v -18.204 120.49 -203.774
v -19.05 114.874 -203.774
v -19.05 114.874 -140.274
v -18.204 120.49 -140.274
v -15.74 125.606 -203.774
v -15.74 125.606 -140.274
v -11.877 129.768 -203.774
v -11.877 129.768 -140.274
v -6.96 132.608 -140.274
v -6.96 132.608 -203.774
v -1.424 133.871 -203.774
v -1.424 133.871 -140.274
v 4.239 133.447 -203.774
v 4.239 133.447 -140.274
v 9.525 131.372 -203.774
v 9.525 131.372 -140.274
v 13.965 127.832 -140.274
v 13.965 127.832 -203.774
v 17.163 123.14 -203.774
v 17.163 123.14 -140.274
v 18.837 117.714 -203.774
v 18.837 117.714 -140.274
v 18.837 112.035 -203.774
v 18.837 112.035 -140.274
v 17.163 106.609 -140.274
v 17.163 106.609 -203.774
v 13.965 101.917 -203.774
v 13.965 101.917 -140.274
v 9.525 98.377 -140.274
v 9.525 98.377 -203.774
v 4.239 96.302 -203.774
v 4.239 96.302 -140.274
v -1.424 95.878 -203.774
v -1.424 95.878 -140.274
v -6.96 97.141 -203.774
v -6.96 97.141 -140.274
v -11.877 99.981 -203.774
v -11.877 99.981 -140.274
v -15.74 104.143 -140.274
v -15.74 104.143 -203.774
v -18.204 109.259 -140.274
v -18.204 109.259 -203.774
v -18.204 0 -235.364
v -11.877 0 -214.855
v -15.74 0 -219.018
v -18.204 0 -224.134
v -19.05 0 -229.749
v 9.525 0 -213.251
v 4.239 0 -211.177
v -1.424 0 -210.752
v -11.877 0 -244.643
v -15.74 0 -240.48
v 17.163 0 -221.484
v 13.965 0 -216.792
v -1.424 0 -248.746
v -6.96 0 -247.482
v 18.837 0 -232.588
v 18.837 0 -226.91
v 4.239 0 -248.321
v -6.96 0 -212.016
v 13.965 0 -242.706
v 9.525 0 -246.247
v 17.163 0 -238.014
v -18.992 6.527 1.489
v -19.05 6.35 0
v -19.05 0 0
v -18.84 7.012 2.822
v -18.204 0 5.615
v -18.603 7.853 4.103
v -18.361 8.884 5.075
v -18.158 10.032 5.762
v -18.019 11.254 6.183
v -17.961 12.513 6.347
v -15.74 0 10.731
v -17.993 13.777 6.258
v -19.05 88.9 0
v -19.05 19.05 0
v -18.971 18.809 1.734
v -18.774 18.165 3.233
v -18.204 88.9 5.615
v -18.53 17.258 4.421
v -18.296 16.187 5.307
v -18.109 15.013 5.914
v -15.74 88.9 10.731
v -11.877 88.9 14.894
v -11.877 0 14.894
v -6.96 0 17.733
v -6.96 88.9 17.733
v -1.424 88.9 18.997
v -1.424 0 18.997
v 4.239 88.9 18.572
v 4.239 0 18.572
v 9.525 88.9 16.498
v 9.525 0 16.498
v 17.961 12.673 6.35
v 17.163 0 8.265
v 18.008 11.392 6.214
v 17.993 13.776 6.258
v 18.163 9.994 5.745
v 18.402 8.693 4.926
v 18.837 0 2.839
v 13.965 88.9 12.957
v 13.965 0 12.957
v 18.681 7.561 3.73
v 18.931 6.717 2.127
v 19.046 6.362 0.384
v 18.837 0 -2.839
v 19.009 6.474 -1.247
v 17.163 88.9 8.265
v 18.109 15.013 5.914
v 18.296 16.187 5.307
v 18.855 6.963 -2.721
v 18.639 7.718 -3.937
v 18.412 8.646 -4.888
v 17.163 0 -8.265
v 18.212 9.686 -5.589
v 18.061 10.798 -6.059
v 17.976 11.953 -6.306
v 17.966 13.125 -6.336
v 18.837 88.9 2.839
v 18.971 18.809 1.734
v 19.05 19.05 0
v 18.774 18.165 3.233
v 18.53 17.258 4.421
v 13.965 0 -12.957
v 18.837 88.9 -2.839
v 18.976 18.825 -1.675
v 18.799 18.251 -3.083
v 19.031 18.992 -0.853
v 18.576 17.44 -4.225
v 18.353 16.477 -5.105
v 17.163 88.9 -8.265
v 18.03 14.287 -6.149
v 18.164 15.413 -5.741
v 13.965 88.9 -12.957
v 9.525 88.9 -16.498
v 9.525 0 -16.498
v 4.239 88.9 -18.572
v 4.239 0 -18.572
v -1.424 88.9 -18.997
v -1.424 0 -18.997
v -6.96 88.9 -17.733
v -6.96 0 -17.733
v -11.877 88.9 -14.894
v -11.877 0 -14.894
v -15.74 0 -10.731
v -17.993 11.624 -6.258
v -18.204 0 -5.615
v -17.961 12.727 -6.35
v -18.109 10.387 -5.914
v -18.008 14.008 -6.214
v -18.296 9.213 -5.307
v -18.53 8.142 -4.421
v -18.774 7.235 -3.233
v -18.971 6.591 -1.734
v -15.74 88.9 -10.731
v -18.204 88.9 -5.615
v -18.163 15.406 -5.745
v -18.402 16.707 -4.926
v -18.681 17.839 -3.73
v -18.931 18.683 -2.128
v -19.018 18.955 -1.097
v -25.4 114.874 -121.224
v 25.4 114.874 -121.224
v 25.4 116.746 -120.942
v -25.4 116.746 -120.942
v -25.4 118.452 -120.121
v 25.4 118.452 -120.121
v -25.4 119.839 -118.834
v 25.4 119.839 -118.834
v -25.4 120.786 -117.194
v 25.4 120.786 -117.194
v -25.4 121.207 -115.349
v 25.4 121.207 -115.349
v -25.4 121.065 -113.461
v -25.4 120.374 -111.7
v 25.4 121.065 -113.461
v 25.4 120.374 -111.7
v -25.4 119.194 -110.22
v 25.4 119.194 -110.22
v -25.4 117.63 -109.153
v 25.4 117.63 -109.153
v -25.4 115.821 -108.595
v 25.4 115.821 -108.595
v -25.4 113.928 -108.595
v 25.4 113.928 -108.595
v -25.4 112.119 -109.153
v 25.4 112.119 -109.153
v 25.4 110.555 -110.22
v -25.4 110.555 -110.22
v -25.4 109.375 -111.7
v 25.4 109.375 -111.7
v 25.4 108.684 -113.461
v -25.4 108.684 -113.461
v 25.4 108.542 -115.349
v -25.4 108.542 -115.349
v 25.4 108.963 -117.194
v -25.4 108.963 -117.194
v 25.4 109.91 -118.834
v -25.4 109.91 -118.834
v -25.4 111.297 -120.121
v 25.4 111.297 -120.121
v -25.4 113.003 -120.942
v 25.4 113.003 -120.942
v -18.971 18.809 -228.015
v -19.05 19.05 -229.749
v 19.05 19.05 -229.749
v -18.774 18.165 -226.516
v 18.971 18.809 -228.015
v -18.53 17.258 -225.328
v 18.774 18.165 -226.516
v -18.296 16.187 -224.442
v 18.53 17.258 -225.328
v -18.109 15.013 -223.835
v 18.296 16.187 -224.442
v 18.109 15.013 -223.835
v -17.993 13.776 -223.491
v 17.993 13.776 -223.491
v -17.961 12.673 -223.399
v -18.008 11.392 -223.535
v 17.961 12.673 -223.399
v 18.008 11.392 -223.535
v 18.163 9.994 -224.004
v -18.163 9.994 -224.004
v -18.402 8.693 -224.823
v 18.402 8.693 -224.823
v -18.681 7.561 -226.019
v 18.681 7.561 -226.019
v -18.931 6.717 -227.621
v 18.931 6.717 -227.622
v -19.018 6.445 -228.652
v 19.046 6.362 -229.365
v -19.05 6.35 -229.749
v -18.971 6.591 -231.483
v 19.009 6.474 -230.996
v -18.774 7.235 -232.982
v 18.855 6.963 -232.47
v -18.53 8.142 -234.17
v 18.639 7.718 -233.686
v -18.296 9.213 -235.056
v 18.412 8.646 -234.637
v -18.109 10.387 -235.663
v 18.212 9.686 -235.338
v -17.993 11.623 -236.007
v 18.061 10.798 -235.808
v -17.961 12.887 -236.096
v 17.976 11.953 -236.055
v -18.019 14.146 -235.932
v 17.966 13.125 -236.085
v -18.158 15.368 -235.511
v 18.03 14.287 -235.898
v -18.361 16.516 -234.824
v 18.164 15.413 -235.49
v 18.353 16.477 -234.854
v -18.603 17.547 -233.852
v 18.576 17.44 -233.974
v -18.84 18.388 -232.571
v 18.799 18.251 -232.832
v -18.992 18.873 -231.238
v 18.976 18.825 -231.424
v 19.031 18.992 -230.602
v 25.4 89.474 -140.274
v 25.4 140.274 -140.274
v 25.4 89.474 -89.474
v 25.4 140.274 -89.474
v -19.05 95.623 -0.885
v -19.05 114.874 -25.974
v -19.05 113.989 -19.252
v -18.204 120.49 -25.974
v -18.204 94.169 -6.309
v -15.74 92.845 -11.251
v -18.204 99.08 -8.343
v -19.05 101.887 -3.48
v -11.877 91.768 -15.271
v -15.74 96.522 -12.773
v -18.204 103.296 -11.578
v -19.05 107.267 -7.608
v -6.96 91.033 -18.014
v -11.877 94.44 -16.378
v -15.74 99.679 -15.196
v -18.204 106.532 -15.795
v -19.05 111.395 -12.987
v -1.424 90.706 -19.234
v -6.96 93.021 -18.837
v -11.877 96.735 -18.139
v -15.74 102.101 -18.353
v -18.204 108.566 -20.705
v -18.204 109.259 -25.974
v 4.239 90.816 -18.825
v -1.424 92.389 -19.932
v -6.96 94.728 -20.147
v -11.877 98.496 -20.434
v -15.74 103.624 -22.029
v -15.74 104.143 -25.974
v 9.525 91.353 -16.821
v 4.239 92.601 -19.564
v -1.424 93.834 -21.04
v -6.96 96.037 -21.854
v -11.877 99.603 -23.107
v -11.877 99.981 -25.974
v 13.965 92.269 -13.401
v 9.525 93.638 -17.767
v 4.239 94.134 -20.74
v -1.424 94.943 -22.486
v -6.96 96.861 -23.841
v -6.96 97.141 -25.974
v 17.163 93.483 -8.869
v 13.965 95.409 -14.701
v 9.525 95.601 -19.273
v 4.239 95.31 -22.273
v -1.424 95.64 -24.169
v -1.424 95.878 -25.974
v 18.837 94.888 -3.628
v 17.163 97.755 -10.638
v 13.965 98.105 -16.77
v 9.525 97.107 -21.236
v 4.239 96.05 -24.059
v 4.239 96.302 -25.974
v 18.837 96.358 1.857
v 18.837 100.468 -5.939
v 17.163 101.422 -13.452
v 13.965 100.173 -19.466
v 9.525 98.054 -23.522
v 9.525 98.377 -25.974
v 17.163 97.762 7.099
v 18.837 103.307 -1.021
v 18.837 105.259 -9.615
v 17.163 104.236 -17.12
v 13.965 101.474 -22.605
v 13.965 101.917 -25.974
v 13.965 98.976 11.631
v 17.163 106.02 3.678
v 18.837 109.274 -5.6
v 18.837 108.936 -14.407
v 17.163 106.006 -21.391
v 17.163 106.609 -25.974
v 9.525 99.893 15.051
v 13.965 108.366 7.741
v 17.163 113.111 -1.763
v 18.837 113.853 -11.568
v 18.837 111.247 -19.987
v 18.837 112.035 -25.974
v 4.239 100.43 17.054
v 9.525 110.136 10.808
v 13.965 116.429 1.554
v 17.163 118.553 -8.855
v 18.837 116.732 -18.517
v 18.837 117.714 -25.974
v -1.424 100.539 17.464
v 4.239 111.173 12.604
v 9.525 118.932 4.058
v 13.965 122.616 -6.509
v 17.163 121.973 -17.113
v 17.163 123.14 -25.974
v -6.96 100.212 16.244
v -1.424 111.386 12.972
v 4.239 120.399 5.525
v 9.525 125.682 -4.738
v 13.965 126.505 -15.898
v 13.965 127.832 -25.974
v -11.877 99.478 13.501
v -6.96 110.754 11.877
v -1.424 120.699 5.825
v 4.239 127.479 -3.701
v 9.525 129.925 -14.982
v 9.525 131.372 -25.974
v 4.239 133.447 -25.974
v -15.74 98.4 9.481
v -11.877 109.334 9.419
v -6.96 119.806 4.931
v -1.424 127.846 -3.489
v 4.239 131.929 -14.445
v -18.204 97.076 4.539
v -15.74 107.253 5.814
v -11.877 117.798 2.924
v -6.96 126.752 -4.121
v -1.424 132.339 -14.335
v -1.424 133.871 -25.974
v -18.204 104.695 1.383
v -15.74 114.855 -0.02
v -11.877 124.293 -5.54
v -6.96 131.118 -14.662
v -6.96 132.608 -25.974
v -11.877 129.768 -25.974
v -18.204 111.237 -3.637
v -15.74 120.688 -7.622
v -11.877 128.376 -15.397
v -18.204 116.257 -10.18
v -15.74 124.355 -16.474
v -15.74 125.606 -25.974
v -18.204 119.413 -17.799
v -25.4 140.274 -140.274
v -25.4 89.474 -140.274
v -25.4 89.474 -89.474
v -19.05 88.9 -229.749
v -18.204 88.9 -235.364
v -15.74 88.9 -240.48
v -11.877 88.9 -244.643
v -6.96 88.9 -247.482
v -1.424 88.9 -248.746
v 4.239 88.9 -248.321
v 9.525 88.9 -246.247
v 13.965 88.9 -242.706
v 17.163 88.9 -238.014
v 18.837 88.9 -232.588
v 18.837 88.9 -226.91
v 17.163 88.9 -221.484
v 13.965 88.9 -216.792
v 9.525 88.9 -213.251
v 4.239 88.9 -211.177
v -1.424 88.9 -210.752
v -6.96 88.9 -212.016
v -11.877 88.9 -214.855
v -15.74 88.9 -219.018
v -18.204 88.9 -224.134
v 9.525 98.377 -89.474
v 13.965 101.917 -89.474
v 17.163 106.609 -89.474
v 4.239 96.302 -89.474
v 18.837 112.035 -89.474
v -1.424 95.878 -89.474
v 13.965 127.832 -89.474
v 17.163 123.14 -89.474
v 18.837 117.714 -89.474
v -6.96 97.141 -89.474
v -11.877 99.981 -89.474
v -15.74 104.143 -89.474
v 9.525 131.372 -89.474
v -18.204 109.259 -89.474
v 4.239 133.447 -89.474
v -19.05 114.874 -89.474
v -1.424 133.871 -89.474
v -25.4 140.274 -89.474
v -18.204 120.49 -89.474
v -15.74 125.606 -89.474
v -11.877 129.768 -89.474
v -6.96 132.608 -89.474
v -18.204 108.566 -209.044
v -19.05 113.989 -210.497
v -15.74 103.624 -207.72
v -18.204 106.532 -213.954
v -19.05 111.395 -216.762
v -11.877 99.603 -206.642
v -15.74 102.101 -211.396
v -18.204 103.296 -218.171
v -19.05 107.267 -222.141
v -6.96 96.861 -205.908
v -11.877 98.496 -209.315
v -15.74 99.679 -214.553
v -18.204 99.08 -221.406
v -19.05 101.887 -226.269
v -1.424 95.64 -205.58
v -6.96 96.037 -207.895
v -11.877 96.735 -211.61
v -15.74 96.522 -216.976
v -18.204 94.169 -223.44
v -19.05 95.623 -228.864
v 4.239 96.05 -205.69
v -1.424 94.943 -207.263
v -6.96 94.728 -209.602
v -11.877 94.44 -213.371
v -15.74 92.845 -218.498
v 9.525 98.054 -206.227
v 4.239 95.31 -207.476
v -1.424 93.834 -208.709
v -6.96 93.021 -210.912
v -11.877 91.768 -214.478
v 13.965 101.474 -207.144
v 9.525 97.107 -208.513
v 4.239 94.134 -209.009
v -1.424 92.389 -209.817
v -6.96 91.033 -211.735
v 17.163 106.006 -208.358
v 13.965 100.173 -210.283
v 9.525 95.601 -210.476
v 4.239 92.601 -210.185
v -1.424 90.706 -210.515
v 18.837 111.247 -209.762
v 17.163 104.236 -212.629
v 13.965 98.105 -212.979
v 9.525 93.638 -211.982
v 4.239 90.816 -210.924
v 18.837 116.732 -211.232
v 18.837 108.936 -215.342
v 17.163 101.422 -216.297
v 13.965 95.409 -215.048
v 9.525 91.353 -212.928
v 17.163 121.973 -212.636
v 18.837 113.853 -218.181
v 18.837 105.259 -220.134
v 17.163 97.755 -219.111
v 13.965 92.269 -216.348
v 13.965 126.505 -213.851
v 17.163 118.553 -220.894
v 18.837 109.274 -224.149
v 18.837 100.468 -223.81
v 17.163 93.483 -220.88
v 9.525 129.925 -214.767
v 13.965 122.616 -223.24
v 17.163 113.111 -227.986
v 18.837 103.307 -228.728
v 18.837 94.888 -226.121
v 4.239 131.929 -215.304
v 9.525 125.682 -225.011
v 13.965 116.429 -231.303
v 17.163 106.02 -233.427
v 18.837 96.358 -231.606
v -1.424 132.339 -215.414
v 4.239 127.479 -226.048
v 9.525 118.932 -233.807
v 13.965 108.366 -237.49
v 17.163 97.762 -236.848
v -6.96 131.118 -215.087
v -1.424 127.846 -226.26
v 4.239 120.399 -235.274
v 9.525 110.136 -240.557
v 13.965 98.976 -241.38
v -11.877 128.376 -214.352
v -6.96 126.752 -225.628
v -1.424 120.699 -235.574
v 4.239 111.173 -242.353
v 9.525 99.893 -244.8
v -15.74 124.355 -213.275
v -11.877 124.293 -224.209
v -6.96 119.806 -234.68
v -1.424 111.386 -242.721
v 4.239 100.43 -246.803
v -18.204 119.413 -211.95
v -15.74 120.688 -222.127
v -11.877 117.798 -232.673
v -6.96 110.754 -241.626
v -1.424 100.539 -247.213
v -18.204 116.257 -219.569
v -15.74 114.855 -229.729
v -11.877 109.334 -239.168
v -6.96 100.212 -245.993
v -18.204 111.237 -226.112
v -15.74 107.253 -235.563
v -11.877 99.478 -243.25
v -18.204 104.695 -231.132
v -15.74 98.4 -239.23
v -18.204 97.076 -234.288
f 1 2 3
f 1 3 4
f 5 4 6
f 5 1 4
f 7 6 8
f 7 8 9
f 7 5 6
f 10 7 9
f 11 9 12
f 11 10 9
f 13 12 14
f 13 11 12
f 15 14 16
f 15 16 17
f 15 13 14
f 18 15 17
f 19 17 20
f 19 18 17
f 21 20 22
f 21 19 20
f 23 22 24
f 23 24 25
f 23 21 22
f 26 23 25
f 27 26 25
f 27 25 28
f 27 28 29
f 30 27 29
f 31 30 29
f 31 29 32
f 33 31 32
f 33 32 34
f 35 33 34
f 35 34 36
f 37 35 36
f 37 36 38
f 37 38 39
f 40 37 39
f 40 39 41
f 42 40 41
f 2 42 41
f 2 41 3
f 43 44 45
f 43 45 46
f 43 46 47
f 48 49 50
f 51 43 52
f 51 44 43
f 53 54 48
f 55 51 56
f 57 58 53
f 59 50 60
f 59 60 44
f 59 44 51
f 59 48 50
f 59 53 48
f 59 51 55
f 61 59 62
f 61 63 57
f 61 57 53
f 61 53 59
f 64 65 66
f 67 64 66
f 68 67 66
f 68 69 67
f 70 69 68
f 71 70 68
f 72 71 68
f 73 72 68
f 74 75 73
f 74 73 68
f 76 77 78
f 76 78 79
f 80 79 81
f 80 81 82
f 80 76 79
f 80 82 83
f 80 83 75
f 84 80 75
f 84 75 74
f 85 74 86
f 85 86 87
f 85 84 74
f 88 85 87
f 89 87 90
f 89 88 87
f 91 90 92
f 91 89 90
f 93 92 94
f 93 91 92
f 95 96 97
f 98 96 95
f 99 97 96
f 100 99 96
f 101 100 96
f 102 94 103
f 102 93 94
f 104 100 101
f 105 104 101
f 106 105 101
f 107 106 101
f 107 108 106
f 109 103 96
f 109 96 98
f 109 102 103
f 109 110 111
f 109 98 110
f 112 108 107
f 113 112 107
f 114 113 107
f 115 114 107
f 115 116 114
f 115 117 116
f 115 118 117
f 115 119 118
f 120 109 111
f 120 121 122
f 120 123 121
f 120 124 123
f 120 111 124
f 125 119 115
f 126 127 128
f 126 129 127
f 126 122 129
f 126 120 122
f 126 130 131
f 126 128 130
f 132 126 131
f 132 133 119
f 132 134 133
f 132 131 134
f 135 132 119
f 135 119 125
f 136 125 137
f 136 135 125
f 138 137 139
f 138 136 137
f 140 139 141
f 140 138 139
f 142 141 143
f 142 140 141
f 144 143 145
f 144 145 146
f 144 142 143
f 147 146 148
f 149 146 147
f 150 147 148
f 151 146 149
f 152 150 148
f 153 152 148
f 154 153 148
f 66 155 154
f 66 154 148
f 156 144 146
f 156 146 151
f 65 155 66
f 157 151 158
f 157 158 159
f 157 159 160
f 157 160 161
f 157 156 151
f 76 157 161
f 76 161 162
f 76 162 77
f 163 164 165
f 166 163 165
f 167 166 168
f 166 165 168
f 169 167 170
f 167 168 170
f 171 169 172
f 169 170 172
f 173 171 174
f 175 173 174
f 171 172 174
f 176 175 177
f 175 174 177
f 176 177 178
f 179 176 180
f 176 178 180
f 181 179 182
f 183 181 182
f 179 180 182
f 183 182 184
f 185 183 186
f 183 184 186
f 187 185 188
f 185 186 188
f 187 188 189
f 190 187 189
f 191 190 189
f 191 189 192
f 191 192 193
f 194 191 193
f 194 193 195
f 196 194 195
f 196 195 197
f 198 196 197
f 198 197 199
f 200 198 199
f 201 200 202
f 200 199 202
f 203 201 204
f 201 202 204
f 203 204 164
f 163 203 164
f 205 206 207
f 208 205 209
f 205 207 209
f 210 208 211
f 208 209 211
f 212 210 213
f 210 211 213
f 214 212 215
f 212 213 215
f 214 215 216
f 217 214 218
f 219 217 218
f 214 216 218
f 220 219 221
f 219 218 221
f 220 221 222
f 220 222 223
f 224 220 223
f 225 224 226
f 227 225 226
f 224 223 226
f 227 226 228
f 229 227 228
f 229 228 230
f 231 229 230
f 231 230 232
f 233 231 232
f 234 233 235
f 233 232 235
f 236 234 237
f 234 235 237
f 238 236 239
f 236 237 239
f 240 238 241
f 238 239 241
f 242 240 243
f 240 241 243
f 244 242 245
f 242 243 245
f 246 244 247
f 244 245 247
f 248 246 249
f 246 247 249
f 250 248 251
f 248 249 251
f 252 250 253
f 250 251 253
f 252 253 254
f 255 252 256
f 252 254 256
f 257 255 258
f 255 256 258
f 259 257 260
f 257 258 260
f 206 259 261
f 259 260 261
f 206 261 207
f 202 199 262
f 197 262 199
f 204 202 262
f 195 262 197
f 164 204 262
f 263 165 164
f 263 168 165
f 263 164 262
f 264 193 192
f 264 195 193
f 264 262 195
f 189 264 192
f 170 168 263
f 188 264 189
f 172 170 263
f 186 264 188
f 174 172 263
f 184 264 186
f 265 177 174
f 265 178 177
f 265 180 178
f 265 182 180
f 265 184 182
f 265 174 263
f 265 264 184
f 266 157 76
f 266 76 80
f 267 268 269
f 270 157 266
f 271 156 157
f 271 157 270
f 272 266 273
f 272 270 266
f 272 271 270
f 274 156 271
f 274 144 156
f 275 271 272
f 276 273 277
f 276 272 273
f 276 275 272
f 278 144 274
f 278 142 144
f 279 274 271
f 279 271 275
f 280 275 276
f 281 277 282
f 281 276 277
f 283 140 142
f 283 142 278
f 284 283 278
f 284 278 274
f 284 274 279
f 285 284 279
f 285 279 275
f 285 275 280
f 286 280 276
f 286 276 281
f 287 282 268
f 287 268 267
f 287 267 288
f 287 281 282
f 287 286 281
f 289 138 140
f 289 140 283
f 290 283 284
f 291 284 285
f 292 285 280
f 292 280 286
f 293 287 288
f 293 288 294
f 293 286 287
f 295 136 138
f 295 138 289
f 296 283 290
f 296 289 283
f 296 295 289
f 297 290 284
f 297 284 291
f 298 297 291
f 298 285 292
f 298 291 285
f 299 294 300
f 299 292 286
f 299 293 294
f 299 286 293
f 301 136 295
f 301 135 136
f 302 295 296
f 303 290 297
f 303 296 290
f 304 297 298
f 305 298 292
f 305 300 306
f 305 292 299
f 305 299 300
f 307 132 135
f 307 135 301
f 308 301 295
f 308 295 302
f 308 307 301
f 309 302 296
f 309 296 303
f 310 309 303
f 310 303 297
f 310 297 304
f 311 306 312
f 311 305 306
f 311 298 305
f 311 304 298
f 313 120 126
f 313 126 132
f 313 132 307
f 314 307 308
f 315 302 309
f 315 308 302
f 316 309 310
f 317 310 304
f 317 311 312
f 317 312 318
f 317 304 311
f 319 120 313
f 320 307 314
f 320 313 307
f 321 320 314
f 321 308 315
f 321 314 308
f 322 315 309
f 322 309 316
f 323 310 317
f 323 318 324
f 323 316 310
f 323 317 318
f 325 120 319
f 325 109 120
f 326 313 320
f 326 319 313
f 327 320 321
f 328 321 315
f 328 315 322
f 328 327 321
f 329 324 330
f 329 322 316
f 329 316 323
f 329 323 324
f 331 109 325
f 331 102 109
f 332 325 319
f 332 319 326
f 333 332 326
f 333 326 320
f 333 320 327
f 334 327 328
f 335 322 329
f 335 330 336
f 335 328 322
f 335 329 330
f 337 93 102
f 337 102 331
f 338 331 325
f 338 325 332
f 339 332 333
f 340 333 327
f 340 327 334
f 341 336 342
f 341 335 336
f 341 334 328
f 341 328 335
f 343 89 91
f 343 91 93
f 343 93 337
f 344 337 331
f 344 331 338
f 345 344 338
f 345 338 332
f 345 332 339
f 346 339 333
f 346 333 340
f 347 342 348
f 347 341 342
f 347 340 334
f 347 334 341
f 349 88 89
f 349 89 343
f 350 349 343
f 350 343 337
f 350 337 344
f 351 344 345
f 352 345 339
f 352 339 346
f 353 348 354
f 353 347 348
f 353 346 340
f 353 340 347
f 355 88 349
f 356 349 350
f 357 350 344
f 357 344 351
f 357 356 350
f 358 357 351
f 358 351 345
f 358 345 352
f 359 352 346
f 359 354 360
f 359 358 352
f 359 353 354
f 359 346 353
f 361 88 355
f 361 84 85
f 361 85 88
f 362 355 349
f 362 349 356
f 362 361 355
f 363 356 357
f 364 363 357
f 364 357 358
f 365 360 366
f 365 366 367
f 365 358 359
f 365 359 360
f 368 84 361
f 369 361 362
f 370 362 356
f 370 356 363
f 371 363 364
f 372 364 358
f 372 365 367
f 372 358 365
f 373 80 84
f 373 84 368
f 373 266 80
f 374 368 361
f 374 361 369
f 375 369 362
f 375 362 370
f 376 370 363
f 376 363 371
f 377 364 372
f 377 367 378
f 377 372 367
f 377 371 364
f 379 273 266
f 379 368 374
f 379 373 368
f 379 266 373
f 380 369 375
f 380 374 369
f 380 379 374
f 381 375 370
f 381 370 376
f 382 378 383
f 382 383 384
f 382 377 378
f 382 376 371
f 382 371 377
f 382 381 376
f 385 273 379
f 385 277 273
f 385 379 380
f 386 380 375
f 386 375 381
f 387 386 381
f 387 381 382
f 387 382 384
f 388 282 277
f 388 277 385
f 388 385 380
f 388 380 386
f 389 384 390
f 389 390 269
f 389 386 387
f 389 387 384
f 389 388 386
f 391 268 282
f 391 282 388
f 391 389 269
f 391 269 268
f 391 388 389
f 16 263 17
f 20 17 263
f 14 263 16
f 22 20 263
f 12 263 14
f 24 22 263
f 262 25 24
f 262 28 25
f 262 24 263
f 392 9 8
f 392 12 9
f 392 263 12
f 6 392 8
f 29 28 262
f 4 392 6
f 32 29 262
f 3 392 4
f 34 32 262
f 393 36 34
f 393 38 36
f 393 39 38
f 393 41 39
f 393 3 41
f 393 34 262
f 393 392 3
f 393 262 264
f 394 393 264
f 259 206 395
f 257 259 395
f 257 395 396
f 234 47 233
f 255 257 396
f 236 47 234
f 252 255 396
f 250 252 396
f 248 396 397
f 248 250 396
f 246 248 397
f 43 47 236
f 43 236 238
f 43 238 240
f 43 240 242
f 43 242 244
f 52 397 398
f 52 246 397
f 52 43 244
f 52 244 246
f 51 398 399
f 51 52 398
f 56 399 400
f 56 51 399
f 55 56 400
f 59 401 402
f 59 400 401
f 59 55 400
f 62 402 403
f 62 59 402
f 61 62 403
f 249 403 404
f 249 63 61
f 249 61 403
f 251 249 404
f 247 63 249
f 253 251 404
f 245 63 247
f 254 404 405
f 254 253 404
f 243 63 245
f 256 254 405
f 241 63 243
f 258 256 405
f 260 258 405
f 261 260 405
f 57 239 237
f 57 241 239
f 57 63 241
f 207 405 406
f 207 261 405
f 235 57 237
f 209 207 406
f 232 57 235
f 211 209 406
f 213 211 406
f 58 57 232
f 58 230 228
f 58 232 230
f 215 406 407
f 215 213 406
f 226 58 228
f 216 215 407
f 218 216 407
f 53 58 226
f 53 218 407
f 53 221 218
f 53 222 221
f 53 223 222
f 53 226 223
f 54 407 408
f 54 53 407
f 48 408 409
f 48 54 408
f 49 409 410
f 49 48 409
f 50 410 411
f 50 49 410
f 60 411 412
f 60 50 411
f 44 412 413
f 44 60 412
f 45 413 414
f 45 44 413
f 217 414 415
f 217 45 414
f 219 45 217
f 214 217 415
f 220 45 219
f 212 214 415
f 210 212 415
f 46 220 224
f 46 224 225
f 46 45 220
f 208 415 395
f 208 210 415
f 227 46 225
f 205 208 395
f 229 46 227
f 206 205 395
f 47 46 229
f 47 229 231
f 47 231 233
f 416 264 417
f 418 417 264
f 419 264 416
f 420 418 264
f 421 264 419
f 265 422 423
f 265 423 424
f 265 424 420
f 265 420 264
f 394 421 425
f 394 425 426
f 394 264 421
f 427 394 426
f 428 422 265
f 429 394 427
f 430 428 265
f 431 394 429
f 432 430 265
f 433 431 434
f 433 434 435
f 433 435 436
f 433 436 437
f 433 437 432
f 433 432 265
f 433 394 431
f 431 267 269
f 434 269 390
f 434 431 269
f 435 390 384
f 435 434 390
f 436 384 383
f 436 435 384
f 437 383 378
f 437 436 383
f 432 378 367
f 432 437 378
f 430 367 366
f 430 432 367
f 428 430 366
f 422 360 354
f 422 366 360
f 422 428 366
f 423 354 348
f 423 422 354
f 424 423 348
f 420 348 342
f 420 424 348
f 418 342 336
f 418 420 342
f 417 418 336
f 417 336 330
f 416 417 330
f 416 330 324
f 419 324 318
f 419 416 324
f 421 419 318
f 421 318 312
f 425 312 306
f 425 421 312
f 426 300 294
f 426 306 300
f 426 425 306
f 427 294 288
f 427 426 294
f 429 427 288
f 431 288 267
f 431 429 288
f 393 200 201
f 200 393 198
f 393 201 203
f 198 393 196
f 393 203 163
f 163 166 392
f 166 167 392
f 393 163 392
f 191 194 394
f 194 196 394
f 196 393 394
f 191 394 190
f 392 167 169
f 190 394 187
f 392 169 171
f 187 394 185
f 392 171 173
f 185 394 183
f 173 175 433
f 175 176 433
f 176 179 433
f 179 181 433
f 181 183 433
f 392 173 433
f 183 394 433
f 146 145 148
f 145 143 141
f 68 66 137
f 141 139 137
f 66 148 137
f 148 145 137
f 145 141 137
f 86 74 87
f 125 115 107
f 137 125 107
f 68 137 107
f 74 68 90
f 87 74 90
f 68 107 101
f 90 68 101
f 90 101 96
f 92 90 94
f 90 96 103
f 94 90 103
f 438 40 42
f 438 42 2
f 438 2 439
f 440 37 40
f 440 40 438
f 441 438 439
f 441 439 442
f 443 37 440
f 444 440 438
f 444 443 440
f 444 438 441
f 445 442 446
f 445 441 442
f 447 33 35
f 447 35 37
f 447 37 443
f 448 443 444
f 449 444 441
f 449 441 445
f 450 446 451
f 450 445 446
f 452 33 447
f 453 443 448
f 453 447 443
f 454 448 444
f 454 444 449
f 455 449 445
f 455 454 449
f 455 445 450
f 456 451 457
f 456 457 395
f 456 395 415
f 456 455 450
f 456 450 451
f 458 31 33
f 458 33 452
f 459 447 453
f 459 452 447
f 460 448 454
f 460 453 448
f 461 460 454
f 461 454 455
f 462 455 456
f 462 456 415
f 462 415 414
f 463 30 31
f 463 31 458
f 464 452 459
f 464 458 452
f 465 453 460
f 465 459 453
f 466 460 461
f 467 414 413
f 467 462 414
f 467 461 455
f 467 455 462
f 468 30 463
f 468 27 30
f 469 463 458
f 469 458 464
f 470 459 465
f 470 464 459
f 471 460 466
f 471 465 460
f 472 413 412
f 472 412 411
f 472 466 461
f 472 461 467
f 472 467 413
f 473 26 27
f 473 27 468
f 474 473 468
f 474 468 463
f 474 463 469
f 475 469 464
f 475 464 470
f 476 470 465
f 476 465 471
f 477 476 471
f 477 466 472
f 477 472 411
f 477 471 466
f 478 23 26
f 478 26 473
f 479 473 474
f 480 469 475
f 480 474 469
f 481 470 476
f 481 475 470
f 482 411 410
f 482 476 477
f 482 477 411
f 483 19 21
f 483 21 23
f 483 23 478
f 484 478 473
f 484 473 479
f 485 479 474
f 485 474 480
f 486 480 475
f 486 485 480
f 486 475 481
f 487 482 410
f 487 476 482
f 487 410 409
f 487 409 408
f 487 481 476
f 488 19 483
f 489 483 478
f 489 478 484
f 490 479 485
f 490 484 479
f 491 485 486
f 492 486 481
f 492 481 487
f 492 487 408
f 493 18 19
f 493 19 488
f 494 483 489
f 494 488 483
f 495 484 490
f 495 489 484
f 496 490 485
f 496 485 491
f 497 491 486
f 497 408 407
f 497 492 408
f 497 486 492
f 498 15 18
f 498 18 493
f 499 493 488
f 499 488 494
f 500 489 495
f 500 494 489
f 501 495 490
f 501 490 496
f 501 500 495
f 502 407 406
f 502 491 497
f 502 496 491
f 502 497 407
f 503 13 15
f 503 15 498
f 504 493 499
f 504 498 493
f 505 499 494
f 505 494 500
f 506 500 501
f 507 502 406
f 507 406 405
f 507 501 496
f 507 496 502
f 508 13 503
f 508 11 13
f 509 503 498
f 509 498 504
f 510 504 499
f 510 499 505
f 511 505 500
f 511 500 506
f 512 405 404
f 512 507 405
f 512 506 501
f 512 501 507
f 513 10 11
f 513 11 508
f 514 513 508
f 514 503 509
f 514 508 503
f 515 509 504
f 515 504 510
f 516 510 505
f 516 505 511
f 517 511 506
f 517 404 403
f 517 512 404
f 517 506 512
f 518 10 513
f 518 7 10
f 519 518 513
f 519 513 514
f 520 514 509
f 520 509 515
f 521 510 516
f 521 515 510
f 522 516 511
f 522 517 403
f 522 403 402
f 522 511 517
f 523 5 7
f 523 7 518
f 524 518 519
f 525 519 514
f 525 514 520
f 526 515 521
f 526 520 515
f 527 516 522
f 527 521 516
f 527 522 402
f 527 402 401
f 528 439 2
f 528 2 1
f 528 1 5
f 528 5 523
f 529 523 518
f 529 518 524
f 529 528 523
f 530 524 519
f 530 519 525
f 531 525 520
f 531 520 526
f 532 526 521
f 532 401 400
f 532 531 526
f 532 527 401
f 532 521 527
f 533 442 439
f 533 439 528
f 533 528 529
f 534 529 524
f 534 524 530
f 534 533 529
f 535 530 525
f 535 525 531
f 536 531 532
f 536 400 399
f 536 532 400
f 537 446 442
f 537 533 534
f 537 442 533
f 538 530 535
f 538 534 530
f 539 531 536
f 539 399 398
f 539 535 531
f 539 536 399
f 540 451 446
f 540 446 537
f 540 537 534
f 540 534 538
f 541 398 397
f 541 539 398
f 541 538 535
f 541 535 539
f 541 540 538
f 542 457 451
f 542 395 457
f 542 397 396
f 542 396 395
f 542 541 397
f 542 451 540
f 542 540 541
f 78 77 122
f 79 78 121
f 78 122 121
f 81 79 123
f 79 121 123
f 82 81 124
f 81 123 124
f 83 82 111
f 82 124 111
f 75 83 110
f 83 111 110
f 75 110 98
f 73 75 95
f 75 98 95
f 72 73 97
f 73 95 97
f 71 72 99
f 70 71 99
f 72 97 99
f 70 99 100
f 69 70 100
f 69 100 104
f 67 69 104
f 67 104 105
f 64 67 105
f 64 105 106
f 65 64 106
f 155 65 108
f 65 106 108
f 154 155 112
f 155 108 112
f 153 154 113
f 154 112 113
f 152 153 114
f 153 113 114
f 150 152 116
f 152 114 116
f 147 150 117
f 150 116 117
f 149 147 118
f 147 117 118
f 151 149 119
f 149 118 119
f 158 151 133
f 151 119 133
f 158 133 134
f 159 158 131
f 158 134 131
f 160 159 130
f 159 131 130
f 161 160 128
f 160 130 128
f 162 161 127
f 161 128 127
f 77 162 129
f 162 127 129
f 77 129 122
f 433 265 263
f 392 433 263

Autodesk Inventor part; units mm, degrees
ref_plane "YZ Plane" through (0, 0, 0) normal (1, 0, 0) x (0, 1, 0)
ref_plane "XZ Plane" through (0, 0, 0) normal (0, 1, 0) x (-1, 0, 0)
ref_plane "XY Plane" through (0, 0, 0) normal (0, 0, 1) x (1, 0, 0)
sketch "Sketch1" plane through (0, 0, 0) normal (0, 1, 0) x (-1, 0, 0)
  circle A0 centre (0, 0) radius 19.05
  dimension "d0" = 38.1
sketch "Sketch2" plane through (0, 0, 0) normal (1, 0, 0) x (0, 1, 0)
  line L0 (0, 0) -> (88.9, 0)
  arc A0 (114.8745, -25.9745) -> (88.9, 0) centre (88.9, -25.9745) ccw
  line L1 (114.8745, -25.9745) -> (114.8745, -203.7745)
  line L2 (0, -229.749) -> (88.9, -229.749)
  arc A1 (88.9, -229.749) -> (113.9345, -210.699) centre (88.9, -203.7745) ccw
  arc A2 (88.9, -229.749) -> (114.8745, -203.7745) centre (88.9, -203.7745) ccw
  dimension "d2" = 88.9
sweep "Sweep1" add profiles "Sketch1" path "Sketch2" path curves L0 A0 L1 A2 L2
sketch "Sketch3" plane through (0, 0, 0) normal (1, 0, 0) x (0, 1, 0)
  line L0 (95.8245, -25.9745) -> (133.9245, -25.9745) projected
  line L1 (133.9245, -25.9745) -> (133.9245, -203.7745)
  line L2 (133.9245, -25.9745) -> (133.9245, -203.7745) projected
  line L3 (133.9245, -114.8745) -> (95.8245, -114.8745)
  line L4 (95.8245, -25.9745) -> (95.8245, -203.7745) projected
  line L5 (89.4745, -89.4745) -> (140.2745, -89.4745)
  line L6 (140.2745, -89.4745) -> (140.2745, -140.2745)
  line L7 (140.2745, -140.2745) -> (89.4745, -140.2745)
  line L8 (89.4745, -140.2745) -> (89.4745, -89.4745)
  line L9 (89.4745, -89.4745) -> (140.2745, -140.2745) construction
  line L10 (140.2745, -89.4745) -> (89.4745, -140.2745) construction
  point P0 (0, 0)
  point P1 (114.8745, -114.8745)
  dimension "d8" = 50.8
  dimension "d9" = 50.8
extrude "Extrusion1" add sketch "Sketch3" along normal mid plane 50.8 contours L5 L1 L3 L4 | L4 L7 L8 L5 | L5 L6 L7 L1 | L3 L1 L7 L4
sketch "Sketch4" plane through (25.4, 0, 0) normal (1, 0, 0) x (0, 0, -1)
  line L0 (140.2745, 140.2745) -> (89.4745, 140.2745) construction
  line L1 (114.8745, 140.2745) -> (114.8745, 89.4745) construction
  line L2 (89.4745, 89.4745) -> (140.2745, 89.4745) construction
  line L3 (140.2745, 95.8245) -> (140.2745, 133.9245) construction
  line L4 (140.2745, 114.8745) -> (89.4745, 114.8745) construction
  line L5 (89.4745, 133.9245) -> (89.4745, 95.8245) construction
  circle A0 centre (114.8745, 114.8745) radius 6.35
  point P0 (0, 0)
  dimension "d23" = 12.7
extrude "Extrusion2" cut sketch "Sketch4" against normal through all
sketch "Sketch5" plane through (0, 0, 0) normal (1, 0, 0) x (0, 1, 0)
  line L0 (0, 0) -> (12.7, 0)
  line L1 (0, 0) -> (12.7, 0) construction
  line L2 (140.2745, -140.2745) -> (140.2745, -89.4745) projected
  line L3 (140.2745, -114.8745) -> (3.175, -114.8745)
  circle A0 centre (12.7, 0) radius 6.35
  circle A1 centre (12.7, -229.749) radius 6.35
  dimension "d16" = 12.7
  dimension "d21" = 12.7
  dimension "d22" = 12.7
extrude "Extrusion3" cut sketch "Sketch5" along normal through all both and the other way through all
properties part number "bogie (1)"
